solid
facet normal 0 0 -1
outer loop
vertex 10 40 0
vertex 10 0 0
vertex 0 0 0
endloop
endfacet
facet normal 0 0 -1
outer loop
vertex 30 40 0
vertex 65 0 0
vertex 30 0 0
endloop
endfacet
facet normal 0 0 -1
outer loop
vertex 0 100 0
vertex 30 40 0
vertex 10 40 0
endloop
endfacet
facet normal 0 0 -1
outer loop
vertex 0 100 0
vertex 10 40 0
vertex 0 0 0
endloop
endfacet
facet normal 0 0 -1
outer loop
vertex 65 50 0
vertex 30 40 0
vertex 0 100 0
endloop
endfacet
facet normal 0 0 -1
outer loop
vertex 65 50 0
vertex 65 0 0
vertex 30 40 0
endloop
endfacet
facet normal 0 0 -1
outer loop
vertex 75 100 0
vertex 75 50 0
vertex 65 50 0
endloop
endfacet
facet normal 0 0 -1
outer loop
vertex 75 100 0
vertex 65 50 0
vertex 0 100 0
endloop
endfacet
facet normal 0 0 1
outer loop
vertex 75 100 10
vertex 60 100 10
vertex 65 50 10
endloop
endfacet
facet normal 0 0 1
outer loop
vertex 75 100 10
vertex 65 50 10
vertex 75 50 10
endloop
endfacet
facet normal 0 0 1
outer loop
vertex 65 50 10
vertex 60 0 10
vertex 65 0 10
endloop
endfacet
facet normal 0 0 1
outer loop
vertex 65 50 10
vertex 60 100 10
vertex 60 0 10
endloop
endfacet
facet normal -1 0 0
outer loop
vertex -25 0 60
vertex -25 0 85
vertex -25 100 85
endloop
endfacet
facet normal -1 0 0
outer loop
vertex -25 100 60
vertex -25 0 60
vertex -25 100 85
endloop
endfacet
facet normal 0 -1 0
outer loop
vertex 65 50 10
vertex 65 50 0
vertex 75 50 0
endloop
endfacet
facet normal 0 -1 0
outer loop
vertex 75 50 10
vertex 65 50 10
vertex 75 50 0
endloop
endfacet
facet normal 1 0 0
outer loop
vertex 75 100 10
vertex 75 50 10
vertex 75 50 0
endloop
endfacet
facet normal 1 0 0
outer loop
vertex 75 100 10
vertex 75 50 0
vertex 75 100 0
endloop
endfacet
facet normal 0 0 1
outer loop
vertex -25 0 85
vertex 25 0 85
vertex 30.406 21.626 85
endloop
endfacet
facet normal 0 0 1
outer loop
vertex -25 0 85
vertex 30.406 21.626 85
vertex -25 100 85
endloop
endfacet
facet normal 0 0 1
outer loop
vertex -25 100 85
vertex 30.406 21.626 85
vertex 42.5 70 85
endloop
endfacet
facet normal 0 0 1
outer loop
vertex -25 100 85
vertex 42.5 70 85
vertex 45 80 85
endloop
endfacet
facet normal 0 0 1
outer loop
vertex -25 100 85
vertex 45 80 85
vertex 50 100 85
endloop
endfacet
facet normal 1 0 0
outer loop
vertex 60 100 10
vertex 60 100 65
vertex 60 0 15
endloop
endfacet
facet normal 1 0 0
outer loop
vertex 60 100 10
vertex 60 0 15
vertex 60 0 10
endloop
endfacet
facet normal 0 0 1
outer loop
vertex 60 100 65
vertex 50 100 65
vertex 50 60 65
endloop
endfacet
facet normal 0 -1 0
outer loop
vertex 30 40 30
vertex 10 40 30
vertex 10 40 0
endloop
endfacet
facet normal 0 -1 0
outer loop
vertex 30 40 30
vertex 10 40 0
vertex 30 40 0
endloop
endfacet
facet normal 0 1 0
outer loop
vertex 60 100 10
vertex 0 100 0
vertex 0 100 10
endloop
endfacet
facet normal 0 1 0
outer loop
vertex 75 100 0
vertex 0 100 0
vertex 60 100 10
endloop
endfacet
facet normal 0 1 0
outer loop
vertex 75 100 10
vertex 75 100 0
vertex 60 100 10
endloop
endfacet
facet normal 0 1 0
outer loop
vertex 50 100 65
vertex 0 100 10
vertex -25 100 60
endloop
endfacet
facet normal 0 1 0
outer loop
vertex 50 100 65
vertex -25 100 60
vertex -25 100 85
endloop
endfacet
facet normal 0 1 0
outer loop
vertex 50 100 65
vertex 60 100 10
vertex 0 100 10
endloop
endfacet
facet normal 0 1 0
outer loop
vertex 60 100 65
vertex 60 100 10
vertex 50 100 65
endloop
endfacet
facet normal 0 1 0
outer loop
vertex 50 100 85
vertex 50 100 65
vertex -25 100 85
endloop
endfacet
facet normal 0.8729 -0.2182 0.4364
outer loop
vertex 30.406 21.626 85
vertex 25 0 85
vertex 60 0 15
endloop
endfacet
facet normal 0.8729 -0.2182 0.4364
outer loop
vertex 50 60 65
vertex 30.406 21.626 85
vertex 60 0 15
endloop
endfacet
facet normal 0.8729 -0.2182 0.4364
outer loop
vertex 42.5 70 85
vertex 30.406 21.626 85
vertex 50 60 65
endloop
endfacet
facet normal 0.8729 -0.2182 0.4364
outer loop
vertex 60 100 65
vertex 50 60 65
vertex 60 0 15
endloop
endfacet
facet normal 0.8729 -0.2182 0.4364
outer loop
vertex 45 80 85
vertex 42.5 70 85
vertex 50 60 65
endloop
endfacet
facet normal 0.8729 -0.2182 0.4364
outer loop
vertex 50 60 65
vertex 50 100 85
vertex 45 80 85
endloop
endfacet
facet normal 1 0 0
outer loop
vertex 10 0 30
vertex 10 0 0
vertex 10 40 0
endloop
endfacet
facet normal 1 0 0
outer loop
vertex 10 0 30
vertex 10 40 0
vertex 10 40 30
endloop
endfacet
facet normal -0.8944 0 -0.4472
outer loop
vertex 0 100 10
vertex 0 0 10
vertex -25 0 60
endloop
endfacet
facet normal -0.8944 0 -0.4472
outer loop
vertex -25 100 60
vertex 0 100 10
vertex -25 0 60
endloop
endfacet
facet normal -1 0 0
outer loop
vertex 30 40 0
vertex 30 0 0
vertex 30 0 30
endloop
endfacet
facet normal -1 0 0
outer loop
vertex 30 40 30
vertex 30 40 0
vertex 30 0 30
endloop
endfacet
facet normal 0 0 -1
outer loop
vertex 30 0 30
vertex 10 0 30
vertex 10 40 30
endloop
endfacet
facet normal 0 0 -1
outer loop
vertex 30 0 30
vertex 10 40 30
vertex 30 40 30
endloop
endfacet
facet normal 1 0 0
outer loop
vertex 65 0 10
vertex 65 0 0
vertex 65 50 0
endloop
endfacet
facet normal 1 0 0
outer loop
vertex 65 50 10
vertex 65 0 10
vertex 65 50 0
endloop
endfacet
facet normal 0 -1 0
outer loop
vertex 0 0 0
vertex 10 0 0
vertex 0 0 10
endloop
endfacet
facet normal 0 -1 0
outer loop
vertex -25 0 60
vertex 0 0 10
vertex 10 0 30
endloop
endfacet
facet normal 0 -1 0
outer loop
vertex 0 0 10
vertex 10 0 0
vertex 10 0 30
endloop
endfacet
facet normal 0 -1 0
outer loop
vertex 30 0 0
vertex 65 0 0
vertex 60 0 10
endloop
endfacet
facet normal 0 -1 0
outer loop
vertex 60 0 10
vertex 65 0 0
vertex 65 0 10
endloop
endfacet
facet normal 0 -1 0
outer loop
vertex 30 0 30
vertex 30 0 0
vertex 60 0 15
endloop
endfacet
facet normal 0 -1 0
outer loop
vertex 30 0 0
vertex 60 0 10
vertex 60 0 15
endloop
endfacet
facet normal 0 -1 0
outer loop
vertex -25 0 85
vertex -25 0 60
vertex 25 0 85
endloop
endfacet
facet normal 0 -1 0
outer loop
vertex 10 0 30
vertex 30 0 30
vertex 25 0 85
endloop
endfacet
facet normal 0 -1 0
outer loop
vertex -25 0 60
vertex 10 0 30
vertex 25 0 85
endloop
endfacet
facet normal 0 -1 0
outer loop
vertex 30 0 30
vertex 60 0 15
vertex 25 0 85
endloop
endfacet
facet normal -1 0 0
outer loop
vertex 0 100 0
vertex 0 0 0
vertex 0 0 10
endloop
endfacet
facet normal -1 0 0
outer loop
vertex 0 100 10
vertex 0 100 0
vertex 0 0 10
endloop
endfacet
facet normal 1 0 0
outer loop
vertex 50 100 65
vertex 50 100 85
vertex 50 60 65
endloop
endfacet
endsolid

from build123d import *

# Parameters (mm, degrees)
F0_W          = 100
F0_H          = 85
F1_DEPTH      = 75
F1_DEPTH_BACK = 25
F3_DEPTH      = 100
F4_W          = 20
F4_H          = 30
F5_DEPTH      = 40
F7_DEPTH      = 100
F8_W          = 10
F8_H          = 50
F9_DEPTH      = 25
F16_DEPTH     = 25


with BuildPart() as f1:
    # F0 (on Right) → F1 (new body, two sides)
    with BuildSketch(Plane.YZ) as f1_sk:
        with Locations((50, 42.5)):
            Rectangle(F0_W, F0_H)
    extrude(amount=F1_DEPTH)
    extrude(f1_sk.sketch, amount=-F1_DEPTH_BACK)

    # F2 (on Front) → F3 (cut, through all)
    with BuildSketch(Plane.XZ):
        Polygon((0, 10), (-25, 60), (-25, 0), (0, 0), align=None)
    extrude(amount=-F3_DEPTH, mode=Mode.SUBTRACT)

    # F4 (on Front) → F5 (cut)
    with BuildSketch(Plane.XZ):
        with Locations((20, 15)):
            Rectangle(F4_W, F4_H)
    extrude(amount=-F5_DEPTH, mode=Mode.SUBTRACT)

    # F6 (on Front) → F7 (cut, through all)
    with BuildSketch(Plane.XZ):
        Polygon((60, 65), (60, 10), (75, 10), (75, 85), (50, 85), (50, 65), align=None)
    extrude(amount=-F7_DEPTH, mode=Mode.SUBTRACT)

    # F8 (on Top) → F9 (cut)
    with BuildSketch(Plane.XY):
        with Locations((70, 25)):
            Rectangle(F8_W, F8_H)
    extrude(amount=F9_DEPTH, mode=Mode.SUBTRACT)

    # F15 (on 3pt) → F16 (cut)
    with BuildSketch(Plane(origin=(51.4285714286, -12.8571428571, 25.7142857143), x_dir=(0.1951800146, 0.9759000729, 0.0975900073), z_dir=(0.8728715609, -0.2182178902, 0.4364357805))):
        Polygon((95.1502571125, 55.9016994375), (84.9033063465, 57.0197334262), (35.3343970406, 62.4281448313), (13.1746509848, 64.8459713475), (13.1746509848, -13.416407865), (115.6441586444, 31.304951685), (74.6563555806, 35.77708764), (115.6441586444, 53.66563146), align=None)
    extrude(amount=F16_DEPTH, mode=Mode.SUBTRACT)


solid = f1.part
